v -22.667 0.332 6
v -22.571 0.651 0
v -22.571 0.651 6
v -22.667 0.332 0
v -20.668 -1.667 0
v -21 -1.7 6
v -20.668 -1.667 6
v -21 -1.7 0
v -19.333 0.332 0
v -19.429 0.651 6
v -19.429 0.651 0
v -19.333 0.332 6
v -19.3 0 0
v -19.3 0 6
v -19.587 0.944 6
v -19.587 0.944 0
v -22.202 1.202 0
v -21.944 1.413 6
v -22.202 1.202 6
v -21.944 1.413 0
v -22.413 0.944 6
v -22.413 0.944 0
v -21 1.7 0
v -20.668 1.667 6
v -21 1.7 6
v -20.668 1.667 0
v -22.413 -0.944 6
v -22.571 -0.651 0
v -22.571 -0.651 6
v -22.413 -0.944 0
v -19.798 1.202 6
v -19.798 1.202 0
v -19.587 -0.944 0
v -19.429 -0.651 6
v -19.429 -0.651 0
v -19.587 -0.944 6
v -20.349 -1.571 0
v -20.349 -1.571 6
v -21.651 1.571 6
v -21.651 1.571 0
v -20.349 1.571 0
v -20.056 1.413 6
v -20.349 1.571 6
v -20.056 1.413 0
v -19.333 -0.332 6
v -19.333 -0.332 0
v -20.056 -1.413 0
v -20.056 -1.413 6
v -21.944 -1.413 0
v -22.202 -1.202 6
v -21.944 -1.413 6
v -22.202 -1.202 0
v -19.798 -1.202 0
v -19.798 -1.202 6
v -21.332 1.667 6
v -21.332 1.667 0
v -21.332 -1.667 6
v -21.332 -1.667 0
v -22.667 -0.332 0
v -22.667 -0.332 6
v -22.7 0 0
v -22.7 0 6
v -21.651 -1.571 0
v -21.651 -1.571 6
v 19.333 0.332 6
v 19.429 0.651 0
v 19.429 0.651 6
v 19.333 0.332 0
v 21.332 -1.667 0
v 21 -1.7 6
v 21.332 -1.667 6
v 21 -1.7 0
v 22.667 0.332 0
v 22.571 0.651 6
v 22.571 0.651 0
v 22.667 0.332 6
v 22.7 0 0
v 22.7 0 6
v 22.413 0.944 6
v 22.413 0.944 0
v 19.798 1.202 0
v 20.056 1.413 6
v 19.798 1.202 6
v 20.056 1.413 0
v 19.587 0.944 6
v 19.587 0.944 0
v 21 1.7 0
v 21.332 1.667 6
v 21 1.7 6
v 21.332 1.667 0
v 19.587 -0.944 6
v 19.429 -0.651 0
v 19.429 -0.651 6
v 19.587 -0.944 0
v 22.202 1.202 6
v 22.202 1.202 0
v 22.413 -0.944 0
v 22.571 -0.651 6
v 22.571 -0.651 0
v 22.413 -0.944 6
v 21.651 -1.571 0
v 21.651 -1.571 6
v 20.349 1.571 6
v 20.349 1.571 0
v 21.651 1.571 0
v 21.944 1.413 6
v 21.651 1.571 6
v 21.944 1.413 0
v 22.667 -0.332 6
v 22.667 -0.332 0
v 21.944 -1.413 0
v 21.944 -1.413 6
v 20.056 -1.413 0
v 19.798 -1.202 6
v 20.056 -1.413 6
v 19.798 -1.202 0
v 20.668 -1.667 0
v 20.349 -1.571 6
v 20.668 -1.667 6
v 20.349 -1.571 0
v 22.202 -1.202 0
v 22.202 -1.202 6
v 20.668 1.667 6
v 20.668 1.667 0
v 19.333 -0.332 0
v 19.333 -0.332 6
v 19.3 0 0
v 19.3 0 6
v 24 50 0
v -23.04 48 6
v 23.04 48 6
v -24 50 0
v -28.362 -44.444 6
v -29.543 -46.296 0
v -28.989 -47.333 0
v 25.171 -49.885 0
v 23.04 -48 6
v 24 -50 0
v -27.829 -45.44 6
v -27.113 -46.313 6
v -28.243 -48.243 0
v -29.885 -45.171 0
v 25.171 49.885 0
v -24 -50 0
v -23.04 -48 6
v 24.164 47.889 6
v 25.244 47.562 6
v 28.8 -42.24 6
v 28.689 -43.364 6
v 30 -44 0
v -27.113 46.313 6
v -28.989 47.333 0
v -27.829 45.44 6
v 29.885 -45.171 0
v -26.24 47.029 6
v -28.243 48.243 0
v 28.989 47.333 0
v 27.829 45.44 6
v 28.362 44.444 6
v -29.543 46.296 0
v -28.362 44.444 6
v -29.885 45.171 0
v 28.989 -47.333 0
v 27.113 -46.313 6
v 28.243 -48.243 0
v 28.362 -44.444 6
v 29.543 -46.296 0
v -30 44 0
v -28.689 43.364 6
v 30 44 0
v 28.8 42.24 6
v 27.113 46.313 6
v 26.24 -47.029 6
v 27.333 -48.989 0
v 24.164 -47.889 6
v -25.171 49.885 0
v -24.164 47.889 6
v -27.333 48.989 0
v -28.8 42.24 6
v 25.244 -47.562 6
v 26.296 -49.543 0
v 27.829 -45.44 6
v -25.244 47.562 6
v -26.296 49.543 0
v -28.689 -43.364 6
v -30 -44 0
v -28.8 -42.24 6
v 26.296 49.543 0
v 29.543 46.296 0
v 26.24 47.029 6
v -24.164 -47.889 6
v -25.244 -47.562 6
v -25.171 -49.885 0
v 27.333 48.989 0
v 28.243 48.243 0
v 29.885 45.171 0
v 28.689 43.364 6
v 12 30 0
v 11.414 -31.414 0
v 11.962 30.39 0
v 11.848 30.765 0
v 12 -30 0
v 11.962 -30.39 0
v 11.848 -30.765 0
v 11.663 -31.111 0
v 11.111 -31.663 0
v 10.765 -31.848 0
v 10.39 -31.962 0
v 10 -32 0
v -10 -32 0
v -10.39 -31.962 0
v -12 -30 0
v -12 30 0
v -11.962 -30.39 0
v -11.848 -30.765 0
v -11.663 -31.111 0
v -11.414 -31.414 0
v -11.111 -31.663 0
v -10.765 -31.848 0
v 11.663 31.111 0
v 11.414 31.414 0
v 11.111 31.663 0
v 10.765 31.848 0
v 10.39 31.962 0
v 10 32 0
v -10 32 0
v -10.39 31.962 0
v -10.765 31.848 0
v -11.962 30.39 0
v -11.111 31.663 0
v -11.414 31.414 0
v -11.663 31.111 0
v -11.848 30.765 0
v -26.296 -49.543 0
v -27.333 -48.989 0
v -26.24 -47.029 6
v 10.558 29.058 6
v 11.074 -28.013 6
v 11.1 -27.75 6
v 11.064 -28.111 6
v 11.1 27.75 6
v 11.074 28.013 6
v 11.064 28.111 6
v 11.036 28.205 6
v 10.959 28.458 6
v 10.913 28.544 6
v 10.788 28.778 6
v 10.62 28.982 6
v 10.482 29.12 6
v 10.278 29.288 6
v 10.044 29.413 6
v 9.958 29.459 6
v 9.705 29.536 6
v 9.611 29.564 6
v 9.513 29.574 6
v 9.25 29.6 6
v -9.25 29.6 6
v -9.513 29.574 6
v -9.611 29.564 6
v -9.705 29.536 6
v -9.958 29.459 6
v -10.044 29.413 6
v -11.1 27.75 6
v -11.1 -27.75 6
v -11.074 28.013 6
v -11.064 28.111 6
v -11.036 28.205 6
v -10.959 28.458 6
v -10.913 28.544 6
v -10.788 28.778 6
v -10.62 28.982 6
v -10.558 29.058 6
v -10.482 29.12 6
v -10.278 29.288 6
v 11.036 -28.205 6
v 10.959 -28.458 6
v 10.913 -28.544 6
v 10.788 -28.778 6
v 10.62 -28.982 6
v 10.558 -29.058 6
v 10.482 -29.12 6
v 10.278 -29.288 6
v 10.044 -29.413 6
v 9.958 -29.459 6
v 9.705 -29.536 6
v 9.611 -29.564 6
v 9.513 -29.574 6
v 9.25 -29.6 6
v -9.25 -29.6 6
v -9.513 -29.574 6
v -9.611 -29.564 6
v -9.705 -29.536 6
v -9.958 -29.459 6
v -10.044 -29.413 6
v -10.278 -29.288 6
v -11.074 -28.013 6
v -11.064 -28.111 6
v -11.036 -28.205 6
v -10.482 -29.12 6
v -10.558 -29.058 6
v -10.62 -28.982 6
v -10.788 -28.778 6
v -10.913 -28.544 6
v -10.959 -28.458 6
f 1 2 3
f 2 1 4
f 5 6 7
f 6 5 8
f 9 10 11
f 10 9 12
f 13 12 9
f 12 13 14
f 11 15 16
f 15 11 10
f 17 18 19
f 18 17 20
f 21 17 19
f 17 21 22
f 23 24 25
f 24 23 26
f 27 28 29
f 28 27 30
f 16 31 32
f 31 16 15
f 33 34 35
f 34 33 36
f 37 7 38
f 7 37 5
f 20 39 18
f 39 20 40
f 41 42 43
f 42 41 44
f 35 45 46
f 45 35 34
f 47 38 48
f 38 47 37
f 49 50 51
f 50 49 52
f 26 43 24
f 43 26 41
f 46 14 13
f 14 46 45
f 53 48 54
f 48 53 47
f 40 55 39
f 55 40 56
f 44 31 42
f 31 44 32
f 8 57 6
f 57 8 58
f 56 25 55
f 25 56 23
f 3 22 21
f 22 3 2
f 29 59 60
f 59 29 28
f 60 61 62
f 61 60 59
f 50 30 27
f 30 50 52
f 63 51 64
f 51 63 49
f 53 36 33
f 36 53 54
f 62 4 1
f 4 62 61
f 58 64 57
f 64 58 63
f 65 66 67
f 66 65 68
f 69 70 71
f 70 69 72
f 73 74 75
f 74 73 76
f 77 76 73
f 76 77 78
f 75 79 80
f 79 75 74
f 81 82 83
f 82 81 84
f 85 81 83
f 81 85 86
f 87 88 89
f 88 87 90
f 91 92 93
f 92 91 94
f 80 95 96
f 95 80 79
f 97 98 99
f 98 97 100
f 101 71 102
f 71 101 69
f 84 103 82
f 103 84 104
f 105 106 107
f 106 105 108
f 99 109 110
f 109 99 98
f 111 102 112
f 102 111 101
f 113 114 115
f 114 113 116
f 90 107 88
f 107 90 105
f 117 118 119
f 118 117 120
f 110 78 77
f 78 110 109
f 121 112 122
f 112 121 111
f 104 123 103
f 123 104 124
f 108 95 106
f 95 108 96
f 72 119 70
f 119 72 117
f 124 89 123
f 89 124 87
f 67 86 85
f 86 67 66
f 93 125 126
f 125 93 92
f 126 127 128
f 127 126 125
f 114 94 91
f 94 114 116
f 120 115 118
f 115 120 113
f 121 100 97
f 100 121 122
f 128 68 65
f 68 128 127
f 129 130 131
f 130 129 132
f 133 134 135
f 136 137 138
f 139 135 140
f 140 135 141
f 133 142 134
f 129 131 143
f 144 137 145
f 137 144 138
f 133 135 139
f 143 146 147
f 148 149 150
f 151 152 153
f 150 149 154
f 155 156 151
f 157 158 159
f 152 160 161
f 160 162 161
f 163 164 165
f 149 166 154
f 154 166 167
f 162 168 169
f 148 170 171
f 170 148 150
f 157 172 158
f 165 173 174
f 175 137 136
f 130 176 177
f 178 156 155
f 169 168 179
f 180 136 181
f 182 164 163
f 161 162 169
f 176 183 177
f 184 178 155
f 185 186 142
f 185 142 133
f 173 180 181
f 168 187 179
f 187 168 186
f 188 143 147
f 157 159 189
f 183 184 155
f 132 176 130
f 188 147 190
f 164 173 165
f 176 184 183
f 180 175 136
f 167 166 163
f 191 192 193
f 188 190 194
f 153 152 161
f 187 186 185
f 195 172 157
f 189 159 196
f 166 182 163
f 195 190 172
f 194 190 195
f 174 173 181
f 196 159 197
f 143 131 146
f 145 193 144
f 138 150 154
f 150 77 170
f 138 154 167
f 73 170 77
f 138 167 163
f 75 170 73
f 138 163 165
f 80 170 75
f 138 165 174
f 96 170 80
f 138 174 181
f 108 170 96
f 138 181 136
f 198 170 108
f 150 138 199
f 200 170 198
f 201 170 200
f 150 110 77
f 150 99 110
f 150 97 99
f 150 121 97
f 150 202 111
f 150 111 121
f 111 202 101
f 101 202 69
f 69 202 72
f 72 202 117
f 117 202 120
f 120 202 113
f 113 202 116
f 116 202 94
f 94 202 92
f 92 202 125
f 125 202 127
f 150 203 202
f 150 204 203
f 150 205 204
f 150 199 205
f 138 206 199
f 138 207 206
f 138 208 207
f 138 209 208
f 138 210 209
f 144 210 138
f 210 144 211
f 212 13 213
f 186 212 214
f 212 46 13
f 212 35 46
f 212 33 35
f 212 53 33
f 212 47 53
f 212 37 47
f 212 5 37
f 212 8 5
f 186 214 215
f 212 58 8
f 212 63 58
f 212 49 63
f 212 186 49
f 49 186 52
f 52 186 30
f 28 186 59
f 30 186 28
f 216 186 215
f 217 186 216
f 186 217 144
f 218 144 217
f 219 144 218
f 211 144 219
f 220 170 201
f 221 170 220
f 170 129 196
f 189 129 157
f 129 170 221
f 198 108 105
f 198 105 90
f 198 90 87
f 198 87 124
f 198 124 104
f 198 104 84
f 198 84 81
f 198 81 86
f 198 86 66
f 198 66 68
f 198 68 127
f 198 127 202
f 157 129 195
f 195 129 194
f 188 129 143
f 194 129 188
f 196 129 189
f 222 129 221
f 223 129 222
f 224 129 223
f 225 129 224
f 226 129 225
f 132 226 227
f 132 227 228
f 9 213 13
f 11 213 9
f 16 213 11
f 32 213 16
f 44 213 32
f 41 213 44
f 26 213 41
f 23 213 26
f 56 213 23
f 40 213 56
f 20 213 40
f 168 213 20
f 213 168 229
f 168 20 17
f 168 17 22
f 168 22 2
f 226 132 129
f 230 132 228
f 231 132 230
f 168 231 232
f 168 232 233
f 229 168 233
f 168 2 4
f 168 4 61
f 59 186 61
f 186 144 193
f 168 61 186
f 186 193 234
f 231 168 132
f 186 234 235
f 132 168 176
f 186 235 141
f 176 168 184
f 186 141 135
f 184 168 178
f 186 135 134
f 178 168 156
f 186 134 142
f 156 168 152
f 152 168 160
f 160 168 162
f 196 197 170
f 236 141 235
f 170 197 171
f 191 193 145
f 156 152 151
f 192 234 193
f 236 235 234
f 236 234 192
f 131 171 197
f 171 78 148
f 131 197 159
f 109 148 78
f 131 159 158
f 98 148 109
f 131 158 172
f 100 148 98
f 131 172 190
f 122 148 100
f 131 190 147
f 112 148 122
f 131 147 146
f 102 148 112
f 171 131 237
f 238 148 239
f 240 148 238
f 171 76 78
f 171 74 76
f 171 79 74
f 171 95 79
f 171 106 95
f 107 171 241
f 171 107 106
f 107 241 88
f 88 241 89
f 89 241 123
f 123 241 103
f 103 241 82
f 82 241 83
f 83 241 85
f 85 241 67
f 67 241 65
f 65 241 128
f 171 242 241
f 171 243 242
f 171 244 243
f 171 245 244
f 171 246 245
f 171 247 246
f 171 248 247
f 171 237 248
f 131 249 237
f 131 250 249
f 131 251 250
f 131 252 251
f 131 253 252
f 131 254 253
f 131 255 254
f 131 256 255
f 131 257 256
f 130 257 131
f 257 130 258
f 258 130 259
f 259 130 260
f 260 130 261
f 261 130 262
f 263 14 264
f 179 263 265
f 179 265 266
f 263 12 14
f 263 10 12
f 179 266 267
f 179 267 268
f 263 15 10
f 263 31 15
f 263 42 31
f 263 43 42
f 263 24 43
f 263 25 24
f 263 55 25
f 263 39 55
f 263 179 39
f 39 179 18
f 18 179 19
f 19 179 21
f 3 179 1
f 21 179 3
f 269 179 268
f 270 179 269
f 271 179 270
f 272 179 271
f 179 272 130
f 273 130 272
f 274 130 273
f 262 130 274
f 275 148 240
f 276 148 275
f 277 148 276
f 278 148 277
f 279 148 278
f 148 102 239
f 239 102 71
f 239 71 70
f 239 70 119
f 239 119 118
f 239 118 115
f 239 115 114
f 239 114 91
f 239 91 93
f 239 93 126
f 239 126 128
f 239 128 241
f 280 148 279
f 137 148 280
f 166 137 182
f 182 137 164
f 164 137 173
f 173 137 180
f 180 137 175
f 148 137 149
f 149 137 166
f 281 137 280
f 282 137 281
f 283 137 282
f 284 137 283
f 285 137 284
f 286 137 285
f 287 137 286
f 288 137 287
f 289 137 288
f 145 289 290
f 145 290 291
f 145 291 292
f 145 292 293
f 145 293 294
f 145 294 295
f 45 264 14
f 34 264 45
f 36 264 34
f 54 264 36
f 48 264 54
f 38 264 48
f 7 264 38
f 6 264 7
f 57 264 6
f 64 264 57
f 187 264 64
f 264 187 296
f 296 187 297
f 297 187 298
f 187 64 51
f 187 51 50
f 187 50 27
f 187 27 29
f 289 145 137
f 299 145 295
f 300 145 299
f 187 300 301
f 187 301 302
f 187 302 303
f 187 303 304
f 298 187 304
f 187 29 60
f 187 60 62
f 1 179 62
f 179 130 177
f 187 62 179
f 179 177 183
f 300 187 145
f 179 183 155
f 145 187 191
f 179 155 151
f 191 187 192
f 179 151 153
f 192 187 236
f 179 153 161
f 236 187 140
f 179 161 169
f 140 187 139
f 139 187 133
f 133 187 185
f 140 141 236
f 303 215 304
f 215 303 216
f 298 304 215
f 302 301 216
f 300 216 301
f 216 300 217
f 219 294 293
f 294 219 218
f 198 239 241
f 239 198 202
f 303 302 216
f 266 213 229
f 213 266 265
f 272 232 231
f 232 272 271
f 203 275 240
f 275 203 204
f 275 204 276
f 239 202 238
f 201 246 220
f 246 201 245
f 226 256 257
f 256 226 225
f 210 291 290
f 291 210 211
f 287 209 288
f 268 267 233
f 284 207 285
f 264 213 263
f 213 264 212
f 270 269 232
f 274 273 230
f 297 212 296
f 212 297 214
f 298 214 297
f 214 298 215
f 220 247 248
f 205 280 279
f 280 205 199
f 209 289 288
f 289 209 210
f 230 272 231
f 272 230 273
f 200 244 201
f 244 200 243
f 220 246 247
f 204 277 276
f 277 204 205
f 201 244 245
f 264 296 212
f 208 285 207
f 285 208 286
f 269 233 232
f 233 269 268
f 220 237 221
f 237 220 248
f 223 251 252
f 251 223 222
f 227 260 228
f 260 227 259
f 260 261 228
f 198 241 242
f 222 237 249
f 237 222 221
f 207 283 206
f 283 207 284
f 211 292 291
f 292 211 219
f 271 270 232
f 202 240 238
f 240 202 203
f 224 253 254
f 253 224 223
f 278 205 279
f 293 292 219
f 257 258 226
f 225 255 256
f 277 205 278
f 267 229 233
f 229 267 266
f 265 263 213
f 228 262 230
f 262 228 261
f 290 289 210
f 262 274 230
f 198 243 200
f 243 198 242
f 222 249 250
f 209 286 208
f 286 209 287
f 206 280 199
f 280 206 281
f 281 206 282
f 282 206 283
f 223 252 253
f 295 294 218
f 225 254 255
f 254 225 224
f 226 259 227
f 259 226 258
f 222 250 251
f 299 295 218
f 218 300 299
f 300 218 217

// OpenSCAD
$fn = 32;

// ----------------------------------------------------------------------
// Display bezel: 60 x 100 mm frame, opening 24x64 mm
// ----------------------------------------------------------------------

// --- parameters (mm) ---
length = 60;              // frame outside length, X
width = 100;              // frame outside width, Y
frame_w = 18;             // frame width
thickness = 6;            // frame thickness
corner_r = 6;             // outside corner radius
chamfer = 0.96;           // outer wall taper
funnel = 0.9;             // inner opening taper
opening_l = 24;           // opening length
opening_w = 64;           // opening width
inner_r = 2;              // opening corner radius
hole_d = 3.4;             // mounting screw clearance
holes_per_side = 1;       // holes per short side
hole_inset = 9;           // hole centre inset from the outside edge

/* rounded-rectangle outlines, generated with loops */
module rounded_ring(l_nom, w_nom, r) {
  hull() {
    for (sx = [-1, 1]) for (sy = [-1, 1])
      translate([sx * (l_nom / 2 - r), sy * (w_nom / 2 - r)]) circle(r = r);
  }
}

difference() {
  /* frame body, drafted so the outer edge is a variable-depth chamfer */
  linear_extrude(height = thickness, scale = chamfer)
    rounded_ring(length, width, corner_r);
  /* viewing opening, drafted the other way for a funnel edge */
  linear_extrude(height = thickness + 2, scale = funnel)
    translate([0, 0, -1]) rounded_ring(opening_l, opening_w, inner_r);
  /* mounting screws through the frame lands */
  for (sx = [-1, 1]) for (i = [1 : holes_per_side])
    translate([sx * (length / 2 - hole_inset),
               (i - (holes_per_side + 1) / 2) * width * 0.5, -1])
      cylinder(h = thickness + 2, d = hole_d);
}
